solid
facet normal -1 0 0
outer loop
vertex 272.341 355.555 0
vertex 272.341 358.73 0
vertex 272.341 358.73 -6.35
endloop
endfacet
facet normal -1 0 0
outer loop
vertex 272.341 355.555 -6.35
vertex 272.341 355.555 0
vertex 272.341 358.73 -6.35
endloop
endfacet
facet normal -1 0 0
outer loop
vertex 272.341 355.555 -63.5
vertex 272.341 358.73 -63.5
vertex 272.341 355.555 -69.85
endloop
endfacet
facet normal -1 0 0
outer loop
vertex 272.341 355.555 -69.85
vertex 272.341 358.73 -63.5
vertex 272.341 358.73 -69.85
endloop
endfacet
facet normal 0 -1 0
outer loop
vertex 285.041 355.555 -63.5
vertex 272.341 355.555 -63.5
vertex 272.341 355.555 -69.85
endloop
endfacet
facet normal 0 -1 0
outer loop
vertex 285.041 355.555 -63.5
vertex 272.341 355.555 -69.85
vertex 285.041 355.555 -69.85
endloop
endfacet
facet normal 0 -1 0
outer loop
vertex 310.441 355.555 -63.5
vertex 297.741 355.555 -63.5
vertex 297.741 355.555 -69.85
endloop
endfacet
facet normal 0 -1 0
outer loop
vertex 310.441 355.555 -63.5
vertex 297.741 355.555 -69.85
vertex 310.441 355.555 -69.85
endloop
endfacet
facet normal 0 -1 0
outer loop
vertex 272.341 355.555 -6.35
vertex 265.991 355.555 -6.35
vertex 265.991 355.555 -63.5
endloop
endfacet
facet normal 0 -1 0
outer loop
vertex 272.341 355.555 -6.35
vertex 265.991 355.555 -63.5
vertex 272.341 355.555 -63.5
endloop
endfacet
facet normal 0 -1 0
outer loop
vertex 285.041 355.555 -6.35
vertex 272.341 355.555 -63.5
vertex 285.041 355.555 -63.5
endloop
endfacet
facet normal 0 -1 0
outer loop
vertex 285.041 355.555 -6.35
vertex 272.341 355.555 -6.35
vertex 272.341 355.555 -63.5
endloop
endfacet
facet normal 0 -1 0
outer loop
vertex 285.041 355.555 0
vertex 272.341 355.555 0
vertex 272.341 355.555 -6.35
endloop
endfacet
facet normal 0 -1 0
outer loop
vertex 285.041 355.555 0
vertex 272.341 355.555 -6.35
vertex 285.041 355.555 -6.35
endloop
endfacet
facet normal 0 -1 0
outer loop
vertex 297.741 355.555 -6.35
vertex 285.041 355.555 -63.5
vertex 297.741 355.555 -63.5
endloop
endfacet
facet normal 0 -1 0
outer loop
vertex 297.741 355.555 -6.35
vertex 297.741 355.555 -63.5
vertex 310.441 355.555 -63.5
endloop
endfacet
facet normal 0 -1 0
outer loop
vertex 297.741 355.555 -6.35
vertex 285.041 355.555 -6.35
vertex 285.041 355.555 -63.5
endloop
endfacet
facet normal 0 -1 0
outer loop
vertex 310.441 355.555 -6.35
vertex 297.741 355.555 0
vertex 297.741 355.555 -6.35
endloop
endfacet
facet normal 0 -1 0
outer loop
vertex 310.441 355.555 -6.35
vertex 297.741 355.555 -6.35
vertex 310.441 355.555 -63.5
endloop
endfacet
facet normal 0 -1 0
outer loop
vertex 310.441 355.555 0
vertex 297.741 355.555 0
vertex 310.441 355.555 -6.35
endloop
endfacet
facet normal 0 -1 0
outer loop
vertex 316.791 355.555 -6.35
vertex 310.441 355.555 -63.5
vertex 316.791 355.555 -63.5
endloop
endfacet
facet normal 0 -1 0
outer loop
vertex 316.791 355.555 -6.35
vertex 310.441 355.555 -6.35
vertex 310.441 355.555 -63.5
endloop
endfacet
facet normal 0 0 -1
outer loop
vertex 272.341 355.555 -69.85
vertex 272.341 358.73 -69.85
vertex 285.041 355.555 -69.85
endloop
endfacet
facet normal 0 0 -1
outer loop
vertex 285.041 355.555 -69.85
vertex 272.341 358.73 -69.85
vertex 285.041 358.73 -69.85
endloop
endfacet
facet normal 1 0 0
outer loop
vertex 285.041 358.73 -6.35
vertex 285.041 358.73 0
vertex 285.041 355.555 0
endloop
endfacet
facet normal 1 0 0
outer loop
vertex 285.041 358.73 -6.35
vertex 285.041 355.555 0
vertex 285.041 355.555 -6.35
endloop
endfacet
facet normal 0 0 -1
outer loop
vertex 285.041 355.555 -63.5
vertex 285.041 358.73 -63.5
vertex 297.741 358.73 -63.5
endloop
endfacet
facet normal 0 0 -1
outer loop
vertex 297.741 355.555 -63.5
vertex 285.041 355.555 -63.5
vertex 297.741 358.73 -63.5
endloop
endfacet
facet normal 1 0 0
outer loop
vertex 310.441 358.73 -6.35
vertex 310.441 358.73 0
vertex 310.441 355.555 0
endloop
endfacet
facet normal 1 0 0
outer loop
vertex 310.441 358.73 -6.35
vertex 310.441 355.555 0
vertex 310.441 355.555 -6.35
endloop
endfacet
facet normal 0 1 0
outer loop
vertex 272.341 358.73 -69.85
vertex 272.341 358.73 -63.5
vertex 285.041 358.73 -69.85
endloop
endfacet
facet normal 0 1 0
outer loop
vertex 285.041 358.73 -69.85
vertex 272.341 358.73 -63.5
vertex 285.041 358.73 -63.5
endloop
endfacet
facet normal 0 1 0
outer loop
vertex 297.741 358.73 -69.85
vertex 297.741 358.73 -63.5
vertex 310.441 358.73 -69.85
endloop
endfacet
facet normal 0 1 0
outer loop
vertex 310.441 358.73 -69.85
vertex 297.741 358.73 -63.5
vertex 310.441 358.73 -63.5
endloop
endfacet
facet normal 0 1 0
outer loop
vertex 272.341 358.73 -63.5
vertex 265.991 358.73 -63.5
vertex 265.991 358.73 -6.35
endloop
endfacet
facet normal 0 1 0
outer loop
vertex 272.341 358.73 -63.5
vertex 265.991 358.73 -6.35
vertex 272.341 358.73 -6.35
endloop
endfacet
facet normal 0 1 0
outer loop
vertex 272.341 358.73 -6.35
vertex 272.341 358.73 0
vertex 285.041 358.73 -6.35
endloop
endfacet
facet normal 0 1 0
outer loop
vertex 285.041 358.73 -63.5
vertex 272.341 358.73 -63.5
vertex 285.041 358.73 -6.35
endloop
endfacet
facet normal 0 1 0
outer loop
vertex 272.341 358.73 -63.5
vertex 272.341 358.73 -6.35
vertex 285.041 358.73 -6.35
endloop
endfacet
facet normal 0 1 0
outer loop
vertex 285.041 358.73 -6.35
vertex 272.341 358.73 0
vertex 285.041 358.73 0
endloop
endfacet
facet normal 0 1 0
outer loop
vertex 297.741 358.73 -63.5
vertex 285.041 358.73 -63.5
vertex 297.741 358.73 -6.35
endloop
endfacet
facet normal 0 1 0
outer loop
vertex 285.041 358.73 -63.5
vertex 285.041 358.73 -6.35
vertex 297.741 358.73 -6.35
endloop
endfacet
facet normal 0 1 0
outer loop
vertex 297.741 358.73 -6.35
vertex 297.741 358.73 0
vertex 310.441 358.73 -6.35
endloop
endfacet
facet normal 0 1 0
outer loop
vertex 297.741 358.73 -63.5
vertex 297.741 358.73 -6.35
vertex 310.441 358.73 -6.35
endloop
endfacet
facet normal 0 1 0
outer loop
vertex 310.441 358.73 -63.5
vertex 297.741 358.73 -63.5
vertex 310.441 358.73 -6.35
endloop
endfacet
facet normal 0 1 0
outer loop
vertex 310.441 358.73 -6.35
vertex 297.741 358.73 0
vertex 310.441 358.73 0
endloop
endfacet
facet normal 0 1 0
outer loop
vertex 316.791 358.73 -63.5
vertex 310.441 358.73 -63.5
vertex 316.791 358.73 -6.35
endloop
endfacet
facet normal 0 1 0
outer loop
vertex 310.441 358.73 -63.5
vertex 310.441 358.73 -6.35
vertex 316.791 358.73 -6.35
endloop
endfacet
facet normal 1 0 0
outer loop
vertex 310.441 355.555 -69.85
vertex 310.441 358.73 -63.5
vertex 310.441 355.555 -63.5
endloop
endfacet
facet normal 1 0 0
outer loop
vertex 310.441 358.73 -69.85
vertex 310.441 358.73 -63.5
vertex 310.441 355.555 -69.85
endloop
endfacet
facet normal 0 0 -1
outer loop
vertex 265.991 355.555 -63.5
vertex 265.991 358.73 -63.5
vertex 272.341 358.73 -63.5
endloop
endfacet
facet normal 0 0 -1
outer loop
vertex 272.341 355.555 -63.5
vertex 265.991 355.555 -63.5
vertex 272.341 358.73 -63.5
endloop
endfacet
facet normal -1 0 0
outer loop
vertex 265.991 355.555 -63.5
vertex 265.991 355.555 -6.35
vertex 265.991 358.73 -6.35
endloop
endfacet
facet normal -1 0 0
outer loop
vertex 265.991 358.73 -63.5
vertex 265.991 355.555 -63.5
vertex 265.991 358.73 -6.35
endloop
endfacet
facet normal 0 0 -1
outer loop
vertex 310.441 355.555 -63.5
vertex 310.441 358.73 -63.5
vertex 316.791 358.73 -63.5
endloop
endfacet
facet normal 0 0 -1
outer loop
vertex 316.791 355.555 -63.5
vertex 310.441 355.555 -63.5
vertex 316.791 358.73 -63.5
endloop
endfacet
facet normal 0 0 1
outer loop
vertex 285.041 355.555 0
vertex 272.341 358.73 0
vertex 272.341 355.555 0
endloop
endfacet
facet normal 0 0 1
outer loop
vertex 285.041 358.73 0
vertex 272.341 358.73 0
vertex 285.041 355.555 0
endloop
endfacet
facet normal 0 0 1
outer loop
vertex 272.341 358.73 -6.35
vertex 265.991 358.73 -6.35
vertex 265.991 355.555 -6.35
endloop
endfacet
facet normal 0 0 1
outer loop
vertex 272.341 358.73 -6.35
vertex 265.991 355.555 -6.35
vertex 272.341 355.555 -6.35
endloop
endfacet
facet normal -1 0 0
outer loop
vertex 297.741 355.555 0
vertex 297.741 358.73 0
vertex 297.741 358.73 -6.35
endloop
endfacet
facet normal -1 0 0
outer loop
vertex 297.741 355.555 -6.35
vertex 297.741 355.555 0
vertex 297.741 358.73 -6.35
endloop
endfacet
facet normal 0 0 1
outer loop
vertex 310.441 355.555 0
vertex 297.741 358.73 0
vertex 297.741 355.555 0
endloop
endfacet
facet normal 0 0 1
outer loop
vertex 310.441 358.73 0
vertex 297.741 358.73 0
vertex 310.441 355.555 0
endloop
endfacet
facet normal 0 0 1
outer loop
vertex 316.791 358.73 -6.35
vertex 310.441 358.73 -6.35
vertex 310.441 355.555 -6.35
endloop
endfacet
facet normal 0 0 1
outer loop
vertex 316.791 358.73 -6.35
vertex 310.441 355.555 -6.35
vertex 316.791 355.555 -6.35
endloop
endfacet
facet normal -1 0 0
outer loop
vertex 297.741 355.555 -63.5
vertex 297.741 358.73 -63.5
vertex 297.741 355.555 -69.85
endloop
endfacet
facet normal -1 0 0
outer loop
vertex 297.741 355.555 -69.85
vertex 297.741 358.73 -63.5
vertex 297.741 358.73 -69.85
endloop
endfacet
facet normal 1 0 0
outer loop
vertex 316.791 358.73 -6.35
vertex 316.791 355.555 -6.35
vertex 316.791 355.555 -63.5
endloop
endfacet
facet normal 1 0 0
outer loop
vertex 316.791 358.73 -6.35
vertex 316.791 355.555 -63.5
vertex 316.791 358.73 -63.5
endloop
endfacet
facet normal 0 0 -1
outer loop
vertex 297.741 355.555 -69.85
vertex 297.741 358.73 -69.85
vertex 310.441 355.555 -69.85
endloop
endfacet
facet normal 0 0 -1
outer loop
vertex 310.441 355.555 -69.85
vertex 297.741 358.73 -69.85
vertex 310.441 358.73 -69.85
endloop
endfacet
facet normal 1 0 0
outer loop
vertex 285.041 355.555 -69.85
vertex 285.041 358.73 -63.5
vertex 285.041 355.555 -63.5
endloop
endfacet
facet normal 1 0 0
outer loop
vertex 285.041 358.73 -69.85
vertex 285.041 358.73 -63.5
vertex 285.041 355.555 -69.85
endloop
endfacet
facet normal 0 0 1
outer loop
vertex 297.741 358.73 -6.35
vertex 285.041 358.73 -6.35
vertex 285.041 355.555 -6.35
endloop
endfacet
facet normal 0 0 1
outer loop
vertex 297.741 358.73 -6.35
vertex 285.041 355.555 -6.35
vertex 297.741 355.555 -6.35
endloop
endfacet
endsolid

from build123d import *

# Parameters (mm, degrees)
SKETCH1_W           = 50.8
SKETCH1_H           = 3.175
BOSS_EXTRUDE1_DEPTH = 69.85
SKETCH2_W           = 6.35
SKETCH2_H           = 6.35
SKETCH2_W_2         = 12.7
CUT_EXTRUDE1_DEPTH  = 325.41579514


with BuildPart() as part:
    # Sketch1 → Boss-Extrude1 (new body)
    with BuildSketch(Plane.XY):
        with Locations((291.390948437, 357.142928402)):
            Rectangle(SKETCH1_W, SKETCH1_H)
    extrude(amount=-BOSS_EXTRUDE1_DEPTH)

    # Sketch2 → Cut-Extrude1 (cut, through all)
    with BuildSketch(Plane(origin=(0, 358.730428402, 0), x_dir=(1, 0, 0), z_dir=(0, 1, 0))):
        with Locations((269.165948437, 66.675)):
            Rectangle(SKETCH2_W, SKETCH2_H)
        with Locations((313.615948437, 66.675)):
            Rectangle(SKETCH2_W, SKETCH2_H)
        with Locations((291.390948437, 66.675)):
            Rectangle(SKETCH2_W_2, SKETCH2_H)
        with Locations((269.165948437, 3.175)):
            Rectangle(SKETCH2_W, SKETCH2_H)
        with Locations((291.390948437, 3.175)):
            Rectangle(SKETCH2_W_2, SKETCH2_H)
        with Locations((313.615948437, 3.175)):
            Rectangle(SKETCH2_W, SKETCH2_H)
    extrude(amount=-CUT_EXTRUDE1_DEPTH, mode=Mode.SUBTRACT)


solid = part.part
